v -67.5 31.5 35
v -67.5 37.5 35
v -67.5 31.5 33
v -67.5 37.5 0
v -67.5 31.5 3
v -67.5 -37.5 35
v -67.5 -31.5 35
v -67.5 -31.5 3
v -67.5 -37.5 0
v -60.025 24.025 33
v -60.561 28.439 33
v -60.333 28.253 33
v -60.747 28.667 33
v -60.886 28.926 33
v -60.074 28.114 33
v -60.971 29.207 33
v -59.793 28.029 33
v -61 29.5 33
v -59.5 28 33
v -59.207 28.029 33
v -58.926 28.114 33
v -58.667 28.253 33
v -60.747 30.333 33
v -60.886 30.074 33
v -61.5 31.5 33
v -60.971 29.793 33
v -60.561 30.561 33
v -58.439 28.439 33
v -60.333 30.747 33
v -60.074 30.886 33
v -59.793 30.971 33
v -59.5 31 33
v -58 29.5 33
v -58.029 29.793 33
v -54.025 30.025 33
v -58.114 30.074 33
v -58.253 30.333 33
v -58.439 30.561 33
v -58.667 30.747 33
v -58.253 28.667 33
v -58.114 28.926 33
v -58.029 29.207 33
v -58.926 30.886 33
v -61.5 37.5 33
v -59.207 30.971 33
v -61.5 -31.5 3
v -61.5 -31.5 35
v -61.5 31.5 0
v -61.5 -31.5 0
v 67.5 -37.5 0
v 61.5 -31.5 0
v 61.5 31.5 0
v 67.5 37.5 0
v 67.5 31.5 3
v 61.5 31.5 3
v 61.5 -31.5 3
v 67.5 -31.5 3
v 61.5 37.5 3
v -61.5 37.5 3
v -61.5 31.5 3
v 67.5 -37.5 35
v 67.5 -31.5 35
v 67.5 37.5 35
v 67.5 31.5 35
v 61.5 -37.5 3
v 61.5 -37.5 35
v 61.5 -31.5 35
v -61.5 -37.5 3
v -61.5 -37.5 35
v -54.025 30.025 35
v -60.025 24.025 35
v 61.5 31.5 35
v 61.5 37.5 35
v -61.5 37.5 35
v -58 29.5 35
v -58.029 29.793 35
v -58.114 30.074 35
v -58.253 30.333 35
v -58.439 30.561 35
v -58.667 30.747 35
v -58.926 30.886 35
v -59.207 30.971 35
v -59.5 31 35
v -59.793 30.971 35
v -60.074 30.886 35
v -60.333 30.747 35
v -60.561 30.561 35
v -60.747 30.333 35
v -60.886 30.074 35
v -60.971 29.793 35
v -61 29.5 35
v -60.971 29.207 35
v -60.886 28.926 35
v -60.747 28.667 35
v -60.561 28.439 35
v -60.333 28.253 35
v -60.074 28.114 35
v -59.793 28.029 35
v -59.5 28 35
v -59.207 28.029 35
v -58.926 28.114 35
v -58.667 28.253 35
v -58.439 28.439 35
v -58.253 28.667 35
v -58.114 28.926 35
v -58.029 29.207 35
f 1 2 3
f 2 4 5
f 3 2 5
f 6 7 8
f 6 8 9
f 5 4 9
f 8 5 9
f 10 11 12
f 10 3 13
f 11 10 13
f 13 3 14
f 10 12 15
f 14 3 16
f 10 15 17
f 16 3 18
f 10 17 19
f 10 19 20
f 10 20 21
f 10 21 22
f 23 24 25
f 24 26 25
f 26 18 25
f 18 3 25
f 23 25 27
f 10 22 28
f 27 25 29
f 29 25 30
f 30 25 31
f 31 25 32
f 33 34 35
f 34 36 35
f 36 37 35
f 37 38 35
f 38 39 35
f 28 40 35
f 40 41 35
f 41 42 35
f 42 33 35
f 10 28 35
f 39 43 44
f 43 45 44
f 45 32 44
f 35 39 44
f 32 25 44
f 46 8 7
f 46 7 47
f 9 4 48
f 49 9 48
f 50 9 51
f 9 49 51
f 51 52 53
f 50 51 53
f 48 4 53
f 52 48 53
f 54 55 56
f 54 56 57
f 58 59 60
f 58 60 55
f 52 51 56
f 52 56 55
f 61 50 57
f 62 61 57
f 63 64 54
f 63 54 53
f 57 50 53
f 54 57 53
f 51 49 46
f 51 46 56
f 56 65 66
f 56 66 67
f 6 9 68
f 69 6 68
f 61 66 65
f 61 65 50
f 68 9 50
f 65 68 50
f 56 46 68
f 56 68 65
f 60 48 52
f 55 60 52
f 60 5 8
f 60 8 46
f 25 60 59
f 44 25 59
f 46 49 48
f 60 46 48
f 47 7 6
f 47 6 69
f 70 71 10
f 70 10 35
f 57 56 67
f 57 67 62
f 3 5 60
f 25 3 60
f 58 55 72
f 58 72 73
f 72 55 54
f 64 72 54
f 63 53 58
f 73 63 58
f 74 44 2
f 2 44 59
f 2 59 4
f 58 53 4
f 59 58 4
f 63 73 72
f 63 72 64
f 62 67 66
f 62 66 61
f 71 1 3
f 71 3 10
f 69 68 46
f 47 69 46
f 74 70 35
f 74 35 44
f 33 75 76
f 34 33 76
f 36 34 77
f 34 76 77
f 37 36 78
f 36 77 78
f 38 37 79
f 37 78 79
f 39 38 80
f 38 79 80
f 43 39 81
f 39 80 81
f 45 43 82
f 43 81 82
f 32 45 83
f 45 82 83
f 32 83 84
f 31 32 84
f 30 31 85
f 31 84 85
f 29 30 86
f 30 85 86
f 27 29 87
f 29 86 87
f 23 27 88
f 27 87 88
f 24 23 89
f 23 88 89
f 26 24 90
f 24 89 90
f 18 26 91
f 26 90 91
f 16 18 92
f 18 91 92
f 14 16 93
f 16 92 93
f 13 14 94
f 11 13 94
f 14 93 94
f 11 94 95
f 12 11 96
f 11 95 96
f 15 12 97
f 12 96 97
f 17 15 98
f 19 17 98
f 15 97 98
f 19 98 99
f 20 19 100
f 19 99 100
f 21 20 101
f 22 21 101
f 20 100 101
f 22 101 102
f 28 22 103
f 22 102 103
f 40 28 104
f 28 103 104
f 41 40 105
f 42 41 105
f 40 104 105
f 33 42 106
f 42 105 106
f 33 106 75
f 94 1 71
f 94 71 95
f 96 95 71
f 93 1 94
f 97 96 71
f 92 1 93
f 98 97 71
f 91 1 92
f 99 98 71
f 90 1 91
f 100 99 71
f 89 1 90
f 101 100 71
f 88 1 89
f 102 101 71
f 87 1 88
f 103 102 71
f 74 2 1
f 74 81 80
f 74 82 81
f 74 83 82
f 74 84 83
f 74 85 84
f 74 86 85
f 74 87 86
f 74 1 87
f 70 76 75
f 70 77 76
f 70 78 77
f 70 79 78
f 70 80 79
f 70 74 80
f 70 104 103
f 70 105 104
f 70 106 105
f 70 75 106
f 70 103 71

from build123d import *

# Parameters (mm, degrees)
F0_W     = 123
F0_H     = 6
F0_W_2   = 6
F0_H_2   = 63
F1_DEPTH = 3
F2_DEPTH = 35
F3_R     = 1.5
F4_DEPTH = 2


with BuildPart() as f1:
    # F0 (on Top) → F1 (new body)
    with BuildSketch(Plane.XY):
        with Locations((0, 34.5)):
            Rectangle(F0_W, F0_H)
        with Locations((-64.5, 0)):
            Rectangle(F0_W_2, F0_H_2)
        with Locations((-64.5, -34.5)):
            Rectangle(F0_W_2, F0_H)
        with Locations((0, -34.5)):
            Rectangle(F0_W, F0_H)
        with Locations((64.5, 0)):
            Rectangle(F0_W_2, F0_H_2)
        with Locations((64.5, -34.5)):
            Rectangle(F0_W_2, F0_H)
        with Locations((64.5, 34.5)):
            Rectangle(F0_W_2, F0_H)
        with Locations((-64.5, 34.5)):
            Rectangle(F0_W_2, F0_H)
    extrude(amount=F1_DEPTH)

    # F0 (on Top) → F2 (join)
    with BuildSketch(Plane.XY):
        with Locations((-64.5, -34.5)):
            Rectangle(F0_W_2, F0_H)
        with Locations((64.5, -34.5)):
            Rectangle(F0_W_2, F0_H)
        with Locations((64.5, 34.5)):
            Rectangle(F0_W_2, F0_H)
        with Locations((-64.5, 34.5)):
            Rectangle(F0_W_2, F0_H)
    extrude(amount=F2_DEPTH)

    # F3 (on face) → F4 (join)
    with BuildSketch(Plane.XY.offset(35)):
        Polygon((-61.5, 31.5), (-67.5, 31.5), (-60.025126, 24.025126), (-54.025126, 30.025126), (-61.5, 37.5), align=None)
        with Locations((-59.5, 29.5)):
            Circle(F3_R, mode=Mode.SUBTRACT)
    extrude(amount=-F4_DEPTH)


solid = f1.part
